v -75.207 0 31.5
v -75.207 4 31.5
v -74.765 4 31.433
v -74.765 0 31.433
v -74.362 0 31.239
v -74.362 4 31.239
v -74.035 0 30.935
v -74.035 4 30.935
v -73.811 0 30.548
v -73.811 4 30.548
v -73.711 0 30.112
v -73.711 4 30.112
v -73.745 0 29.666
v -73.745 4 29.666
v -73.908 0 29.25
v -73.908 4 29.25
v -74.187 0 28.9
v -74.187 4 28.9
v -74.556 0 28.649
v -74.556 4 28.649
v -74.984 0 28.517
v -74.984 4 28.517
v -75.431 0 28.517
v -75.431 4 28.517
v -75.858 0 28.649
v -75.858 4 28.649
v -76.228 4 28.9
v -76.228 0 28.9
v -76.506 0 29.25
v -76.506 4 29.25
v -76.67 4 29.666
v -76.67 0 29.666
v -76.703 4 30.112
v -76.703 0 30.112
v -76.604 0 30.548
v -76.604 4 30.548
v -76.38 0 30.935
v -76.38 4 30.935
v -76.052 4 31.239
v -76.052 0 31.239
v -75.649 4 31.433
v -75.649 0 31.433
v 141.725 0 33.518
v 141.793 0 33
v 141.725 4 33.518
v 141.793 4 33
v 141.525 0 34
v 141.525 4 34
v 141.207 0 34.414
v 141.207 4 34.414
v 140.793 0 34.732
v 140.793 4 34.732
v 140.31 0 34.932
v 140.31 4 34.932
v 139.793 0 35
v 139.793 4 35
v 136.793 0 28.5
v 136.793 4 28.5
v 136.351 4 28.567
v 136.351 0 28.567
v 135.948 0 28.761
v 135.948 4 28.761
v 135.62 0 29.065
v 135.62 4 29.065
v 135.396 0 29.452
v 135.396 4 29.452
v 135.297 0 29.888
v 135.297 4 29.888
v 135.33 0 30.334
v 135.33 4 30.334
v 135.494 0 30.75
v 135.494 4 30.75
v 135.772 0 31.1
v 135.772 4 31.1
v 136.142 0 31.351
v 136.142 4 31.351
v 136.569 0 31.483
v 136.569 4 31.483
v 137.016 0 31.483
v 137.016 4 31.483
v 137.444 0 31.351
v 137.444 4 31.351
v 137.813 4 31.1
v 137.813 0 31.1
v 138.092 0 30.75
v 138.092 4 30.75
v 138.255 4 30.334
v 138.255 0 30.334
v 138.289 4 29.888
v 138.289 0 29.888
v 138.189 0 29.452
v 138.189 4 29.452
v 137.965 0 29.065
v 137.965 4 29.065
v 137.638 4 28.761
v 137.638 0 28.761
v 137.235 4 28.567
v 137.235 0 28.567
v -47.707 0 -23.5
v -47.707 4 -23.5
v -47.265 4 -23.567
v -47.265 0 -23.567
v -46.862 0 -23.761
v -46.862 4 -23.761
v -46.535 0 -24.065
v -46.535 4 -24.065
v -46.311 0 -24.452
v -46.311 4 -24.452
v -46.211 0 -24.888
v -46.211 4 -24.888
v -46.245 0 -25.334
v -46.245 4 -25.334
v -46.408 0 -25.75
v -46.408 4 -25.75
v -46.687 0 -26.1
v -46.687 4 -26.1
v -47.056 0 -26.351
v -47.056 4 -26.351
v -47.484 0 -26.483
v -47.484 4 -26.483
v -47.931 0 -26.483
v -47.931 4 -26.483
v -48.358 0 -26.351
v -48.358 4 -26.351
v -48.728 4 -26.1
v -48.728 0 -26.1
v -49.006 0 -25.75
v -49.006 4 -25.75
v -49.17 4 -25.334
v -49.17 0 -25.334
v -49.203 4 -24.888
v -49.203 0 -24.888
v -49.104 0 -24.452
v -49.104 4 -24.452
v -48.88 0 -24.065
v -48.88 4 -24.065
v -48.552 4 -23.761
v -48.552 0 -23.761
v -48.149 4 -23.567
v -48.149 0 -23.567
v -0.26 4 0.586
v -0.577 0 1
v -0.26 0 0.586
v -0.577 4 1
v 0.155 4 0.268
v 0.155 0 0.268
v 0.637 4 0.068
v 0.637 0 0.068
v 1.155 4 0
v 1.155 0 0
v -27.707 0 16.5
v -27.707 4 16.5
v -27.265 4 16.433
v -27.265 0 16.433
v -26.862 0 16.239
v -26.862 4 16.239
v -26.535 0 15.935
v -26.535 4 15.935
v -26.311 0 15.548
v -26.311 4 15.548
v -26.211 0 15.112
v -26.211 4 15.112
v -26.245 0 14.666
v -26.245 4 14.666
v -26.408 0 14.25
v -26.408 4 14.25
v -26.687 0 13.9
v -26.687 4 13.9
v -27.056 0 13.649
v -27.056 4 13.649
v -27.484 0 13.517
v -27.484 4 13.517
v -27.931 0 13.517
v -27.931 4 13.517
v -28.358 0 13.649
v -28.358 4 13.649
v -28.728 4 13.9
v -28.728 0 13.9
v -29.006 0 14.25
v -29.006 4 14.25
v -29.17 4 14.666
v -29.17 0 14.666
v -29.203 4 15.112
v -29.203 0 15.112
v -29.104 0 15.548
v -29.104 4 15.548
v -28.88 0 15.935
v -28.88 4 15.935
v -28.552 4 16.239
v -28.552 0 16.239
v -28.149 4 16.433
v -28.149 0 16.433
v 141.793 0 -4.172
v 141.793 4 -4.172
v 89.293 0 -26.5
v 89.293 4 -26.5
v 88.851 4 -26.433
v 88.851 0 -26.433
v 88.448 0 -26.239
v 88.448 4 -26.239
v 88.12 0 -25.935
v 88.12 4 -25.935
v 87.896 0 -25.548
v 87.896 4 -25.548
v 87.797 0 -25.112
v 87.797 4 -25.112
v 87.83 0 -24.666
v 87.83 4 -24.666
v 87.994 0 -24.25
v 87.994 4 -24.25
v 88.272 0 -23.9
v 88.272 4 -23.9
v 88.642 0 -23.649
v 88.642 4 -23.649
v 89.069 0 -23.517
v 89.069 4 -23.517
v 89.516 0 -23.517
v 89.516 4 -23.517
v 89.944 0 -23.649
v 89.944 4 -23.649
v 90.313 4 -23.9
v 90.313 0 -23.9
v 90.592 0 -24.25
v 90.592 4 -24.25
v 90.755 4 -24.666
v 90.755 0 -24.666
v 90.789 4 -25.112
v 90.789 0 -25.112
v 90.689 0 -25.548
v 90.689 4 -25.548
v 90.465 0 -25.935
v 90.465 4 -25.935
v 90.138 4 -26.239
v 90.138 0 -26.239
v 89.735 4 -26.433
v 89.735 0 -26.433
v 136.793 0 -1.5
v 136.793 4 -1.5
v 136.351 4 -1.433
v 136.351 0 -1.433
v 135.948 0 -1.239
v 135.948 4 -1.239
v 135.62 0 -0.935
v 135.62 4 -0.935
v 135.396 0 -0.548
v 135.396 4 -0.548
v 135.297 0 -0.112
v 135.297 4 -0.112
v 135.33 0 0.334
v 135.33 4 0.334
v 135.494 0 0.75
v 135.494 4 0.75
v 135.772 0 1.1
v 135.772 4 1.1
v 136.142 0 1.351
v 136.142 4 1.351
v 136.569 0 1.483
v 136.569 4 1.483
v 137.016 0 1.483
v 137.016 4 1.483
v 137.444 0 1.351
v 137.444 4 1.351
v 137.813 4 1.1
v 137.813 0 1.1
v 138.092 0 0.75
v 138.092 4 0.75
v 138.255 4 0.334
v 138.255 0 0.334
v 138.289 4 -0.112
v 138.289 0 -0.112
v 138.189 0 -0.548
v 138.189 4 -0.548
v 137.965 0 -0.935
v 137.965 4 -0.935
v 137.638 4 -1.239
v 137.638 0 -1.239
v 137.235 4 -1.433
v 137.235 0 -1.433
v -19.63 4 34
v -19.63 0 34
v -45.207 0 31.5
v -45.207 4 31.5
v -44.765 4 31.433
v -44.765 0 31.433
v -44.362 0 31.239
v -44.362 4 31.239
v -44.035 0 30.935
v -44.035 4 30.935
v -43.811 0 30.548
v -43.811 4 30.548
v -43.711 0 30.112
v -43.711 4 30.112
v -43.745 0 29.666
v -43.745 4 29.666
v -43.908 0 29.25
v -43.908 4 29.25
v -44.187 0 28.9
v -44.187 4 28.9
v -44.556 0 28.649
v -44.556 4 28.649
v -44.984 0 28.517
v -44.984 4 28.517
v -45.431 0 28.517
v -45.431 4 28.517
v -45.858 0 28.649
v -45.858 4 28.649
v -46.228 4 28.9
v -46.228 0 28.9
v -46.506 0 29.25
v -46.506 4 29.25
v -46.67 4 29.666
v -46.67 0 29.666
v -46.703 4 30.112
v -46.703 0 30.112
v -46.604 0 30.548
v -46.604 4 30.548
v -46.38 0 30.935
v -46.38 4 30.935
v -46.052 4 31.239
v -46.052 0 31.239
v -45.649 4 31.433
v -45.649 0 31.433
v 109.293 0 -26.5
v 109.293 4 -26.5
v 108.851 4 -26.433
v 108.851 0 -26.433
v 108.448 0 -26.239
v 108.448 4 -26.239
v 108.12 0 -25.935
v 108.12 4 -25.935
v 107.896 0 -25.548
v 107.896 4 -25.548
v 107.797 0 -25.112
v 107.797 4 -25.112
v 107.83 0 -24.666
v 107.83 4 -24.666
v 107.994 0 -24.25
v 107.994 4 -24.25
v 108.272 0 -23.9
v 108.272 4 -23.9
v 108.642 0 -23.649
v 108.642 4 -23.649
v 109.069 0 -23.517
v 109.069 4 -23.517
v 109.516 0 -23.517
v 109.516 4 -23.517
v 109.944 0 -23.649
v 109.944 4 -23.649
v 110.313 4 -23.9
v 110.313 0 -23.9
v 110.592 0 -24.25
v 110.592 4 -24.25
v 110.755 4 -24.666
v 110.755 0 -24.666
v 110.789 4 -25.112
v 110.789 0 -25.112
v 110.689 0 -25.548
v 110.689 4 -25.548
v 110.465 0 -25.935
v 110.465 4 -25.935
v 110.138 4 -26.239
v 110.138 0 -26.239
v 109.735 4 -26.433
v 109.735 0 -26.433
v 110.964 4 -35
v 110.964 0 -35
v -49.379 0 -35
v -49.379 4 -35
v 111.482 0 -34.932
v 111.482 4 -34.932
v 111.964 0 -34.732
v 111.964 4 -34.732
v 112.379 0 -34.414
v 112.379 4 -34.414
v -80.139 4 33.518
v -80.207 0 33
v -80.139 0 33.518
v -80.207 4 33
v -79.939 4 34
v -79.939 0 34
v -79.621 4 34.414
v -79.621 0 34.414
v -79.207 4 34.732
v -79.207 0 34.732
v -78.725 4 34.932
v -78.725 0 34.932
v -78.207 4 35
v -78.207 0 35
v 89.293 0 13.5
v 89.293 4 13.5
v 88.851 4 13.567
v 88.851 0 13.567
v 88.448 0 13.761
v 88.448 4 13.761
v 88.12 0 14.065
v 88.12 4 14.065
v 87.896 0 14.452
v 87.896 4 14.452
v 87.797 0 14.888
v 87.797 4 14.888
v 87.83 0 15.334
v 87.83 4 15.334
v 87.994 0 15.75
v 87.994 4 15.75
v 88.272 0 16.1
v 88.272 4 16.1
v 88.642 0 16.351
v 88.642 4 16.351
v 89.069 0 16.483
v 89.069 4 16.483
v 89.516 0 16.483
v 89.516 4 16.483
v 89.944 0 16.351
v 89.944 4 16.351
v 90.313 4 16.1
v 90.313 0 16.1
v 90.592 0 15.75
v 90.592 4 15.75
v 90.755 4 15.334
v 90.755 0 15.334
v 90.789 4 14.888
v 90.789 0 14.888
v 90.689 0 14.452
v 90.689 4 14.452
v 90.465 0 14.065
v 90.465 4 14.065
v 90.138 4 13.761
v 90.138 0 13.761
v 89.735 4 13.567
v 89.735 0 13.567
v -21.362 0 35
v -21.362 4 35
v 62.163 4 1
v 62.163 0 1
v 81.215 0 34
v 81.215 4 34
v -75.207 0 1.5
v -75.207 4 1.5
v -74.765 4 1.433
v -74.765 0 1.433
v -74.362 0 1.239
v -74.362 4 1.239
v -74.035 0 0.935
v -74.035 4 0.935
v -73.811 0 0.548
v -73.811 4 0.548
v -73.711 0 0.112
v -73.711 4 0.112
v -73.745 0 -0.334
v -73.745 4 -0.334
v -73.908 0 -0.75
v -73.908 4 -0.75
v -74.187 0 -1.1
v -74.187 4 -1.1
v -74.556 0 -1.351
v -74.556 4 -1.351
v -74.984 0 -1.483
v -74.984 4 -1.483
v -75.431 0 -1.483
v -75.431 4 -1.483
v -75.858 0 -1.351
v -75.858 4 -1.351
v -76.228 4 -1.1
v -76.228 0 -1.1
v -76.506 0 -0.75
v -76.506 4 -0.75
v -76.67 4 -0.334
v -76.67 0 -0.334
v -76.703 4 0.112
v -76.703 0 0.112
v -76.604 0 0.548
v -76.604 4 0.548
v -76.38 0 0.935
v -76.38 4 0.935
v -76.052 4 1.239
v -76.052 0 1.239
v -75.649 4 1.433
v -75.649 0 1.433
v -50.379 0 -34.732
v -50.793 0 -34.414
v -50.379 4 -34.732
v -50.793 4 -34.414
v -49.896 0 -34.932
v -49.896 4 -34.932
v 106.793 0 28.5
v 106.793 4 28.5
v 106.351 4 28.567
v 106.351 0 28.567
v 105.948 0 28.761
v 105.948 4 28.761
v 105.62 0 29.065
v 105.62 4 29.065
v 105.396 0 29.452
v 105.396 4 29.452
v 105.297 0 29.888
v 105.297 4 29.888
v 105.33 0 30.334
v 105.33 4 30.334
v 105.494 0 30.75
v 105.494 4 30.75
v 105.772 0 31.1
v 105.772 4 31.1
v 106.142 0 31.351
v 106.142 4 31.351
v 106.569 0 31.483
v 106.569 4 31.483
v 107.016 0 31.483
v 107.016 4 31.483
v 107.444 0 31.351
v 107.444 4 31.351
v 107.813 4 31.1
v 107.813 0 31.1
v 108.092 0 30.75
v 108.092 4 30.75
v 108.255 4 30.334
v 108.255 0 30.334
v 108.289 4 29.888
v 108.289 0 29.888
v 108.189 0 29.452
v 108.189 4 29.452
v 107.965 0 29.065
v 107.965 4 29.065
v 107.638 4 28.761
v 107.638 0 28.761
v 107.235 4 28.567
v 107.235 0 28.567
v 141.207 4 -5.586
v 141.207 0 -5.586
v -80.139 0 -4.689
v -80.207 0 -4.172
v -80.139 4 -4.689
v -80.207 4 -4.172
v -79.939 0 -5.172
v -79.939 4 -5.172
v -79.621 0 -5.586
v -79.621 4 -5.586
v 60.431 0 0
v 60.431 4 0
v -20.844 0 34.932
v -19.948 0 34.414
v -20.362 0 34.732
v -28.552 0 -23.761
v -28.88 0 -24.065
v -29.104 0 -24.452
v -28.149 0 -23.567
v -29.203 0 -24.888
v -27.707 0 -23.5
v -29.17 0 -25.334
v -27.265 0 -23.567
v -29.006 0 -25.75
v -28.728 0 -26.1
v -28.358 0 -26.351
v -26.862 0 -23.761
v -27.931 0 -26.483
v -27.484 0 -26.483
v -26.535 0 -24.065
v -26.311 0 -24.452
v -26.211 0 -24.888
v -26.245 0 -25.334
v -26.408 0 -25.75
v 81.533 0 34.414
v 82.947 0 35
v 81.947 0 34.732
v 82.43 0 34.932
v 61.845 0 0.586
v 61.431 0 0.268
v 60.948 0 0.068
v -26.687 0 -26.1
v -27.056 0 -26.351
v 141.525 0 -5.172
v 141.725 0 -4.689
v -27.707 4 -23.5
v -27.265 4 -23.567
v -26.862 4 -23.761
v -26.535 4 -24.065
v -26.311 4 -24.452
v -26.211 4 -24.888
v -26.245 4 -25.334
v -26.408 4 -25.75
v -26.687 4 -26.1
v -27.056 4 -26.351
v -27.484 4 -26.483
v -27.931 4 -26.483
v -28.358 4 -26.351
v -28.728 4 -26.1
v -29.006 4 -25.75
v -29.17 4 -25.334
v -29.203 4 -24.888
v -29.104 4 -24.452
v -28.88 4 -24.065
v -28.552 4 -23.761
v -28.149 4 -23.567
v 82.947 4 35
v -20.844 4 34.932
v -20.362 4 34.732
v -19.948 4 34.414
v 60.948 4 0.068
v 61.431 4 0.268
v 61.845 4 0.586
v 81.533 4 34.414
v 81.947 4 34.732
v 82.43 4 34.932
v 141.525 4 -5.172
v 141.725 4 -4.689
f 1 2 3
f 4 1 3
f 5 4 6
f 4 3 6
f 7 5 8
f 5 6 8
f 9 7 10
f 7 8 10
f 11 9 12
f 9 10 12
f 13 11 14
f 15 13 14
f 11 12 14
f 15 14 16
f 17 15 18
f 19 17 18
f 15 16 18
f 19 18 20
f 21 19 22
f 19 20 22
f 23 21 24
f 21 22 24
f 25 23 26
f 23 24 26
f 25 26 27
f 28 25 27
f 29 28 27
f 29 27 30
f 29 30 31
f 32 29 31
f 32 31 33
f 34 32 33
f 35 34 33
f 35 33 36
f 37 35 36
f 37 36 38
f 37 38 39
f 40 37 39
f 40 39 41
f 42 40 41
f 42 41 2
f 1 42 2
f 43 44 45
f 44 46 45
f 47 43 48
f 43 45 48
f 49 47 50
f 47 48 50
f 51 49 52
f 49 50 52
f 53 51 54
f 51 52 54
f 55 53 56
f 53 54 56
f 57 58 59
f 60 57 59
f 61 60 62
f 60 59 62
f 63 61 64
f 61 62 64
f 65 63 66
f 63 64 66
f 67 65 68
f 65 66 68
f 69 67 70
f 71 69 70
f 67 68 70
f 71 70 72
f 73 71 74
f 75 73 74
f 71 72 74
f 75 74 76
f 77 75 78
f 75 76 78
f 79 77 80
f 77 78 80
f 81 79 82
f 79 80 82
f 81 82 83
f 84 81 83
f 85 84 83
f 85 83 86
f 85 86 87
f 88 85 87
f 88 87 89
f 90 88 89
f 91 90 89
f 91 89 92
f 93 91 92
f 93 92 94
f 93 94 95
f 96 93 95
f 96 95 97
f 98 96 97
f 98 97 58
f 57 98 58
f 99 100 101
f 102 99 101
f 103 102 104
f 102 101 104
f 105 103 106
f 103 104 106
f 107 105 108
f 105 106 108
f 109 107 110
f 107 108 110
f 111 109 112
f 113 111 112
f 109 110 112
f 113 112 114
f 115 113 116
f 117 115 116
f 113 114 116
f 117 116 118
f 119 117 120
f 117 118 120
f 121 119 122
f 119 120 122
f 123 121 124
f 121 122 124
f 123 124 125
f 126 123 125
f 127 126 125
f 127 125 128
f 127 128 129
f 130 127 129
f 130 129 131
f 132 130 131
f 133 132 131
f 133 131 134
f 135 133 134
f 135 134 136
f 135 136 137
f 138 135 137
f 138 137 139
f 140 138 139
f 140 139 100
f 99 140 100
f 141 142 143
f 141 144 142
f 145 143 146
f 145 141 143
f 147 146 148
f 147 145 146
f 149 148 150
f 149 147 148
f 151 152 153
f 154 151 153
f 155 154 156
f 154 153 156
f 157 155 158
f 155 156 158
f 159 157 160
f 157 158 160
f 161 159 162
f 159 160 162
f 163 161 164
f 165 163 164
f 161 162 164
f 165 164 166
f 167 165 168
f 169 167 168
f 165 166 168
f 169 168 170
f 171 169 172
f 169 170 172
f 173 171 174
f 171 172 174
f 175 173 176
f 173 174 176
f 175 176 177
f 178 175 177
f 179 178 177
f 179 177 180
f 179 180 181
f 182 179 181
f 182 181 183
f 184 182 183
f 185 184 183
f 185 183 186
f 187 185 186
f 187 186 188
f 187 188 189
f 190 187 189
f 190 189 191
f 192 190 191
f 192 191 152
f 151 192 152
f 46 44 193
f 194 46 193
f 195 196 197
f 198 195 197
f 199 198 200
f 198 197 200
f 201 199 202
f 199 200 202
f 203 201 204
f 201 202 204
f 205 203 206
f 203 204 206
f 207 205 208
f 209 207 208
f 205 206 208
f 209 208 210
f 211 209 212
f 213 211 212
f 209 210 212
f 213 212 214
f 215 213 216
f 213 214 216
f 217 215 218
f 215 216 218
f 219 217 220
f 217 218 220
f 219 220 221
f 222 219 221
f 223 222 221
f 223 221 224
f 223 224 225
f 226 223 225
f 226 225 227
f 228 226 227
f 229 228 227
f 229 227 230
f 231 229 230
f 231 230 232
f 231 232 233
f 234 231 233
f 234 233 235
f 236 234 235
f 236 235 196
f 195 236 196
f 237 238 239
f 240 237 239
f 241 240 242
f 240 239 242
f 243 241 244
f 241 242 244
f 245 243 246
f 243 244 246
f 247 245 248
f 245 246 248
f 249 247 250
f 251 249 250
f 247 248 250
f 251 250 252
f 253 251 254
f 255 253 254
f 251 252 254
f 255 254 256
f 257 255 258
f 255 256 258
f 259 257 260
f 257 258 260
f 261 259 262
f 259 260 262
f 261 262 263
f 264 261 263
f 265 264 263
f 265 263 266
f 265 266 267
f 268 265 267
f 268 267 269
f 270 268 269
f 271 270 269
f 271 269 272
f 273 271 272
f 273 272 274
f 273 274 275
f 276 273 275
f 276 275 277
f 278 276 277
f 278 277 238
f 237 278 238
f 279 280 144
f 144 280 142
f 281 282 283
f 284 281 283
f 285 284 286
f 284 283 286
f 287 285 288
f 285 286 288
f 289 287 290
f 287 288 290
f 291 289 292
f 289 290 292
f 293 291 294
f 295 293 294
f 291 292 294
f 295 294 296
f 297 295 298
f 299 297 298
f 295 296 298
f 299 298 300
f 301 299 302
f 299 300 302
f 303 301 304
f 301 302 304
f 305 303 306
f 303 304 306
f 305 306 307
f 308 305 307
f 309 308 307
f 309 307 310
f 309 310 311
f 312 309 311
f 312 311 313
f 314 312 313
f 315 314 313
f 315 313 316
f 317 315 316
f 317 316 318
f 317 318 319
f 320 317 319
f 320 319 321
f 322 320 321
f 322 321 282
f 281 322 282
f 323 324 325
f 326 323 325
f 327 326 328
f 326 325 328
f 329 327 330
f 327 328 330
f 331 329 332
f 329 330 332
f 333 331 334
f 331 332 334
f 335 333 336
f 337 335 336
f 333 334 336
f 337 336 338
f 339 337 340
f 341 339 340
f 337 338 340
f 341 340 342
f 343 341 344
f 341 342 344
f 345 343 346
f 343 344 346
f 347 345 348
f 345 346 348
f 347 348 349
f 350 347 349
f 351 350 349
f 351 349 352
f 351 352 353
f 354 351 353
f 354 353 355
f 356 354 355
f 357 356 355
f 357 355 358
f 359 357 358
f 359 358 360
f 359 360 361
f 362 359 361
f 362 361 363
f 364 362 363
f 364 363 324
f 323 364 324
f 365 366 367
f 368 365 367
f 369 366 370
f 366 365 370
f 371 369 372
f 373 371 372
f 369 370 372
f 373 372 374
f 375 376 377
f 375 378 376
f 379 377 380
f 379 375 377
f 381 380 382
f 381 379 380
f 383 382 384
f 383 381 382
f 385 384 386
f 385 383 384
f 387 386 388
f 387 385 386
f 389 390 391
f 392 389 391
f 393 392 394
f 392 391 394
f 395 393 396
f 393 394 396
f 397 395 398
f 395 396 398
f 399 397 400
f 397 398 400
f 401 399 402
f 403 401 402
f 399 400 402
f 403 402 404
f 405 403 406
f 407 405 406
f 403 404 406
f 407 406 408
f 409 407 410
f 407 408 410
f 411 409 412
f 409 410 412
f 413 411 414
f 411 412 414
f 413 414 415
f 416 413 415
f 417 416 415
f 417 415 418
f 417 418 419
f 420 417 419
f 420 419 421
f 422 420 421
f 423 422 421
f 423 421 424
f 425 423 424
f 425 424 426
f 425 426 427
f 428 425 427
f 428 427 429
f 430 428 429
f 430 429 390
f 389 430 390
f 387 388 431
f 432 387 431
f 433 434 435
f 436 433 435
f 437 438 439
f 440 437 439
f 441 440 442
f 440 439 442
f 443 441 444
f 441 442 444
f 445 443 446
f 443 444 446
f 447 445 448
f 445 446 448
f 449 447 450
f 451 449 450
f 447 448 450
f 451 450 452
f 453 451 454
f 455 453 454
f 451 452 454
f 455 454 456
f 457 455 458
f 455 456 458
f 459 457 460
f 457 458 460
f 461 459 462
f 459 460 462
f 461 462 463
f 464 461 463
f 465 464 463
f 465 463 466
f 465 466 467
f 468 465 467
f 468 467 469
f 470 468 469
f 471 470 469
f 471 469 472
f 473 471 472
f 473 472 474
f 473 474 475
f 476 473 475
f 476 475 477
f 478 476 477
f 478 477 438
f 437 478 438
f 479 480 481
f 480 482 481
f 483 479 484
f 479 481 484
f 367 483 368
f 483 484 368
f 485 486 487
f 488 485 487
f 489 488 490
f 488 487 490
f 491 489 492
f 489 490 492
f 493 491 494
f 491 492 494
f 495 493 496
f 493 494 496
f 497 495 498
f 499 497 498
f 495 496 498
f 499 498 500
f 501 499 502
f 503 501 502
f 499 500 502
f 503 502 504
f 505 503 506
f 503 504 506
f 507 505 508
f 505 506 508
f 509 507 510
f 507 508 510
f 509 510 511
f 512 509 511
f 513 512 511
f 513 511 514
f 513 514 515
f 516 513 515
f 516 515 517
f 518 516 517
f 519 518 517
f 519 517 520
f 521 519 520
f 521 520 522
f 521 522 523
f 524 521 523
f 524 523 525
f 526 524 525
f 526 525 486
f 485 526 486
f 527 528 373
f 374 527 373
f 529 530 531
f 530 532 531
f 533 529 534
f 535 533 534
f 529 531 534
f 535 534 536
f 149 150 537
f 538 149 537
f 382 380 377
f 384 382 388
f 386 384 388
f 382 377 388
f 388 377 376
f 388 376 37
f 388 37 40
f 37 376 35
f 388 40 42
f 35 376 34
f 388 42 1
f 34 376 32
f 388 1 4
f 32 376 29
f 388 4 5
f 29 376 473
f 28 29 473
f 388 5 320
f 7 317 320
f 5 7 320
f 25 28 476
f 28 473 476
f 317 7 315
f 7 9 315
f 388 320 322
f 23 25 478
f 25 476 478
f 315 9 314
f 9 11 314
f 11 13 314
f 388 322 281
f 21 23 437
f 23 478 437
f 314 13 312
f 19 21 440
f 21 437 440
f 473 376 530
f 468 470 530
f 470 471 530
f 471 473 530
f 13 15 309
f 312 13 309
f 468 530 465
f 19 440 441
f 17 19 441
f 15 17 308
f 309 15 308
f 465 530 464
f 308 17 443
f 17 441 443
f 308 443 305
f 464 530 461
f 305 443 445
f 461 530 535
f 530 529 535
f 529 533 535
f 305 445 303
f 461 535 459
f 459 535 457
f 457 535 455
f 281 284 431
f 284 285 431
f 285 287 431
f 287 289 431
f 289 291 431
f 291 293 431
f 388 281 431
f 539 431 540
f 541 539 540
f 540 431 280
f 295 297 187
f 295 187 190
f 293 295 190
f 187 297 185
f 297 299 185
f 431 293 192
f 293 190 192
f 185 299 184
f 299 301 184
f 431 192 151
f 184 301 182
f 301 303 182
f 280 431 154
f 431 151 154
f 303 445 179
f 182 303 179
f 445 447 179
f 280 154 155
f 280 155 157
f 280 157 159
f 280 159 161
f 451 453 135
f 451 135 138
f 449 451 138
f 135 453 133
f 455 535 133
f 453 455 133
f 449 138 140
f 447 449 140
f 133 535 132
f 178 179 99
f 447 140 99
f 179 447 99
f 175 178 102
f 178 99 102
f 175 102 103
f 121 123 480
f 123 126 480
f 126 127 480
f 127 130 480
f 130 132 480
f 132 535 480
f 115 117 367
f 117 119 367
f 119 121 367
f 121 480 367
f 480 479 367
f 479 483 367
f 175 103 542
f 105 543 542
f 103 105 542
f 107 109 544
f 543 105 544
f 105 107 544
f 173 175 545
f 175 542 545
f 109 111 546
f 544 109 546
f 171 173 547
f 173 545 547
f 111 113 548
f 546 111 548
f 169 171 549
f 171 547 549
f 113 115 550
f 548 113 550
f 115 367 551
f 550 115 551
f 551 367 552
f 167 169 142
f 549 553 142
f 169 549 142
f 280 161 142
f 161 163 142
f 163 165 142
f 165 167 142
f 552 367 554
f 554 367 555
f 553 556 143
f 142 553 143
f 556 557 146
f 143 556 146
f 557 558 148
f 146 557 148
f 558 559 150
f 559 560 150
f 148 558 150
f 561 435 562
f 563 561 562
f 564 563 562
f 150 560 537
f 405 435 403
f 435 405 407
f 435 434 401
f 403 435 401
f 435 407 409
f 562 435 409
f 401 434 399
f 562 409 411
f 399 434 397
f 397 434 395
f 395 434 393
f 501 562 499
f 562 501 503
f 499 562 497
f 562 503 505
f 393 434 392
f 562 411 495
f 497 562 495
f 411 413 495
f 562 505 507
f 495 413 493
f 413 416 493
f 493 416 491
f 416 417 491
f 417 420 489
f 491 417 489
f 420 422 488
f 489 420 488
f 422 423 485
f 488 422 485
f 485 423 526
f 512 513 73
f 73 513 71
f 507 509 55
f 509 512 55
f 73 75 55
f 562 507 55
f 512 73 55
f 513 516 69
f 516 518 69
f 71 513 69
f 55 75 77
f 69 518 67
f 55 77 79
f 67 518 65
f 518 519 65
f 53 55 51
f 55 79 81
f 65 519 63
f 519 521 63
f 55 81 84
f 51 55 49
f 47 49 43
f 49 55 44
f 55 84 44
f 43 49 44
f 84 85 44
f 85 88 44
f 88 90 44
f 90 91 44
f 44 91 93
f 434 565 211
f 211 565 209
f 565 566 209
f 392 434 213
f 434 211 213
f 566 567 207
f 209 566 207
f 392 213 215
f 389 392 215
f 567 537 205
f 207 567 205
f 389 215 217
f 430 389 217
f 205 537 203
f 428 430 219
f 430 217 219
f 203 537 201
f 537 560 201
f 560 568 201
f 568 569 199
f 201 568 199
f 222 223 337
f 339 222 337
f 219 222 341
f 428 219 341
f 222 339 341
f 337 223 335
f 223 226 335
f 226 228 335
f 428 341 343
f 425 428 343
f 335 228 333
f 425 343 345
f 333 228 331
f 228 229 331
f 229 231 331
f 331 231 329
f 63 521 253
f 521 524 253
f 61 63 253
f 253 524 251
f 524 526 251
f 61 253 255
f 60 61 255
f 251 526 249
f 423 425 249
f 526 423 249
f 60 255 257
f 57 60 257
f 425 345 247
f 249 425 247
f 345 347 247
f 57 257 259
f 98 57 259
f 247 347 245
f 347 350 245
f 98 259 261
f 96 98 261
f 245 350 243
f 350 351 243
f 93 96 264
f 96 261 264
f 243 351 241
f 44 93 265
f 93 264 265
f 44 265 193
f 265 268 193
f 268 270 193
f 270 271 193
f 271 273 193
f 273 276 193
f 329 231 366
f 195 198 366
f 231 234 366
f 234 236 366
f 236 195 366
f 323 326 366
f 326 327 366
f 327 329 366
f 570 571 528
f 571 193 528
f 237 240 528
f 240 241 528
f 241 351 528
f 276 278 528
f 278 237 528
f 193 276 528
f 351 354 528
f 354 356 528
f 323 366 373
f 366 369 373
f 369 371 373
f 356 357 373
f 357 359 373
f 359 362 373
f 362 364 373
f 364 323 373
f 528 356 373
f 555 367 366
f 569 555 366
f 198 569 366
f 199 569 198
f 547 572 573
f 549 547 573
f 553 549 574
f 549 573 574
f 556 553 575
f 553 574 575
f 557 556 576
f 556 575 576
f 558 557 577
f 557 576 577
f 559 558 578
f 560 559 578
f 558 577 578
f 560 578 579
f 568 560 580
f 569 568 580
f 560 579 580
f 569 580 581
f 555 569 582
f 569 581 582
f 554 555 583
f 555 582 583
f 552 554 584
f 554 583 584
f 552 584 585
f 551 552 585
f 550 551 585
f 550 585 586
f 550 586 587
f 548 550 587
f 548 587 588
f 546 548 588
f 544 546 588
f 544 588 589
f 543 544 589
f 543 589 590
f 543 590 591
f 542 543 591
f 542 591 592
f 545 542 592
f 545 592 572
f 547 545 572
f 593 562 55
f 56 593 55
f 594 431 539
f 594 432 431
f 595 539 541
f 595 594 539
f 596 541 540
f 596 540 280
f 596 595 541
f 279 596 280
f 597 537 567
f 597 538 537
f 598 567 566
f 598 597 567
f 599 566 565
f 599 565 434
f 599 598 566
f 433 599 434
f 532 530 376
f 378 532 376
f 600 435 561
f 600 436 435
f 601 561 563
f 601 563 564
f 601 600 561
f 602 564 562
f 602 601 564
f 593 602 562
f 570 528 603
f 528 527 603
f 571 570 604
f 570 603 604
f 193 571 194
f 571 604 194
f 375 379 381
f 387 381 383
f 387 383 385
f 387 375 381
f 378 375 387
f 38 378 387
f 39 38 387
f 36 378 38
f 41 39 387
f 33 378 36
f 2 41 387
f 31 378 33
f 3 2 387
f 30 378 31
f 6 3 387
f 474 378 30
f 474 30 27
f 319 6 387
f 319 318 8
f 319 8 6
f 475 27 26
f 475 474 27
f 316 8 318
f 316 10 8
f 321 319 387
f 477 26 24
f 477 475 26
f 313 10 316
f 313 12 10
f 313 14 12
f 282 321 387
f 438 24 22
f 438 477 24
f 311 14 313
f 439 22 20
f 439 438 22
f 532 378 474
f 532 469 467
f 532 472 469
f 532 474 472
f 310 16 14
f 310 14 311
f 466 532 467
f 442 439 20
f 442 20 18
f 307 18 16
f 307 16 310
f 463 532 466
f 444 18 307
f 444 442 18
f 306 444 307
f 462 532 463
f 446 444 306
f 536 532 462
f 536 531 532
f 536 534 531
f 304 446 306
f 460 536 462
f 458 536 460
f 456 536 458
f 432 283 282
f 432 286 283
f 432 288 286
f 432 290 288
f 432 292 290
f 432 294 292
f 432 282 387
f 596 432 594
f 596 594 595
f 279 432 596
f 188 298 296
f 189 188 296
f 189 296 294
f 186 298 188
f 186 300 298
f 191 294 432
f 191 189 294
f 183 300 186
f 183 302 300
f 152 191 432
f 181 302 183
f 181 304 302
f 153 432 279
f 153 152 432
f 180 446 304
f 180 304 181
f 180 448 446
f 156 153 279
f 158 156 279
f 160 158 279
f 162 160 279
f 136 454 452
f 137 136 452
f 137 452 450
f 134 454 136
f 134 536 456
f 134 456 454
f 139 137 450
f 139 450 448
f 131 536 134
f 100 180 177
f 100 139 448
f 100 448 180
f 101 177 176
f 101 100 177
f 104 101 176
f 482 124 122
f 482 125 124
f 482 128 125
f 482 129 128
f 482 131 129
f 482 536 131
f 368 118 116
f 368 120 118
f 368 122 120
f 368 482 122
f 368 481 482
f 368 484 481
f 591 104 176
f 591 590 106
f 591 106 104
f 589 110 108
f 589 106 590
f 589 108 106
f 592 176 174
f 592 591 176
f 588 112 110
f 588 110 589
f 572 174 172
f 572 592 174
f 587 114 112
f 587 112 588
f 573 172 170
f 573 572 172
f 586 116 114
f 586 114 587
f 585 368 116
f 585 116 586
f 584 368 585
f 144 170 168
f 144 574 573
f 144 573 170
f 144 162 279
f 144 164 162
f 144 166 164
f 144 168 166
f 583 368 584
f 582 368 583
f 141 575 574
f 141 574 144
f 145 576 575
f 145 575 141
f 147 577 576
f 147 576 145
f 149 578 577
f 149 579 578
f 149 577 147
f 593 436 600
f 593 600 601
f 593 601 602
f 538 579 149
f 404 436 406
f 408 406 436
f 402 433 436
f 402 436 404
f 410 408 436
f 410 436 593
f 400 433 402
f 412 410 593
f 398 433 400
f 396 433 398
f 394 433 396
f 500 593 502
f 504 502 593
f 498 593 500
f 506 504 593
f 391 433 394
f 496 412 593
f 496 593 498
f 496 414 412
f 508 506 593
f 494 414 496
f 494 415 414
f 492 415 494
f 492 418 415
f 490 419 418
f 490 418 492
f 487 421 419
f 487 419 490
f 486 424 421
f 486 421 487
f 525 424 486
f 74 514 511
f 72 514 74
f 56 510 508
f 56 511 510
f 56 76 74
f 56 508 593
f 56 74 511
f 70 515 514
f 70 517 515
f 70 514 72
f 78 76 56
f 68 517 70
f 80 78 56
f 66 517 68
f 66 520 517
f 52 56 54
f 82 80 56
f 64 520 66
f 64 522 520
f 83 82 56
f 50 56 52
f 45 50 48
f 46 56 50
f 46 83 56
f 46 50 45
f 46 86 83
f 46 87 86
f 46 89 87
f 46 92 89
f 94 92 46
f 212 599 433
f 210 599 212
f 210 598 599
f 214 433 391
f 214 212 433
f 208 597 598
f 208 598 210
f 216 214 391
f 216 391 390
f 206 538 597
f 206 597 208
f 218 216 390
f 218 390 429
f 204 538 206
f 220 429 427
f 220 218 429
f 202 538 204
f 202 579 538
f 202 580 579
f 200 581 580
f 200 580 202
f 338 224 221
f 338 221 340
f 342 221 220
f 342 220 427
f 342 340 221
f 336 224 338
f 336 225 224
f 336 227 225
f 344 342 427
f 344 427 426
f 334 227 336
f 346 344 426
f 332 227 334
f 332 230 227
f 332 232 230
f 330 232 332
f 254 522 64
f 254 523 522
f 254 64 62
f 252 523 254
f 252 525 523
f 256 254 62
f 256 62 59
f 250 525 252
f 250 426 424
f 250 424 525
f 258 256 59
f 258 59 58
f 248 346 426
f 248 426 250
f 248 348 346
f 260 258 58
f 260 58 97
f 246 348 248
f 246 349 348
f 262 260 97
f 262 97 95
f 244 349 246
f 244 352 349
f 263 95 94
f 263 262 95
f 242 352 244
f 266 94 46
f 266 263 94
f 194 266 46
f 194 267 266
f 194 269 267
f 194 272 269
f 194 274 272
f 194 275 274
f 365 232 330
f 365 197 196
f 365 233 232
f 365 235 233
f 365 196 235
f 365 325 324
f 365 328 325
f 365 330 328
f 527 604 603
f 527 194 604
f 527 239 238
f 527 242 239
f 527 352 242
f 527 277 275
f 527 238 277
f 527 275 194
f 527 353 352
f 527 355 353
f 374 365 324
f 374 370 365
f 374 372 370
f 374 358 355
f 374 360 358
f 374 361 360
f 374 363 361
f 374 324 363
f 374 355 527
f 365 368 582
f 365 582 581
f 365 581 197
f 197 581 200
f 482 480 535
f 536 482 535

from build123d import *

# Parameters (mm, degrees)
EXTRUDE_1_DEPTH     = 4
SKETCH_2_R          = 1.5
CUT_EXTRUDE_1_DEPTH = 10
FILLET_2_R          = 2


with BuildPart() as part:
    # 草图1 → 凸台-拉伸1 (new body)
    with BuildSketch(Plane(origin=(0, 0, 0), x_dir=(1, 0, 0), z_dir=(0, 1, 0))):
        Polygon((-80.207259422, 5), (-80.207259422, -35), (-20.207259422, -35), (0, 0), (61.585481157, 0), (81.792740578, -35), (141.792740578, -35), (141.792740578, 5), (111.792740578, 35), (-50.207259422, 35), align=None)
    extrude(amount=EXTRUDE_1_DEPTH)

    # 草图2 → 切除-拉伸1 (cut)
    with BuildSketch(Plane(origin=(0, 4, 0), x_dir=(1, 0, 0), z_dir=(0, 1, 0))):
        with Locations(Location((-27.707259422, -15, 0), (0, 0, 270))):
            Circle(SKETCH_2_R)
        with Locations(Location((-27.707259422, 25, 0), (0, 0, 270))):
            Circle(SKETCH_2_R)
        with Locations(Location((-75.207259422, -30, 0), (0, 0, 270))):
            Circle(SKETCH_2_R)
        with Locations(Location((-45.207259422, -30, 0), (0, 0, 270))):
            Circle(SKETCH_2_R)
        with Locations(Location((-75.207259422, 0, 0), (0, 0, 270))):
            Circle(SKETCH_2_R)
        with Locations(Location((-47.707259422, 25, 0), (0, 0, 270))):
            Circle(SKETCH_2_R)
        with Locations(Location((109.292740578, 25, 0), (0, 0, 90))):
            Circle(SKETCH_2_R)
        with Locations(Location((136.792740578, 0, 0), (0, 0, 90))):
            Circle(SKETCH_2_R)
        with Locations(Location((106.792740578, -30, 0), (0, 0, 90))):
            Circle(SKETCH_2_R)
        with Locations(Location((136.792740578, -30, 0), (0, 0, 90))):
            Circle(SKETCH_2_R)
        with Locations(Location((89.292740578, 25, 0), (0, 0, 90))):
            Circle(SKETCH_2_R)
        with Locations(Location((89.292740578, -15, 0), (0, 0, 90))):
            Circle(SKETCH_2_R)
    extrude(amount=-CUT_EXTRUDE_1_DEPTH, mode=Mode.SUBTRACT)

    # 圆角2
    fillet_2_edges = [part.edges().sort_by_distance(p)[0] for p in [
        (-50.207259422, 2, -35),
        (111.792740578, 2, -35),
        (141.792740578, 2, -5),
        (141.792740578, 2, 35),
        (81.792740578, 2, 35),
        (61.585481157, 2, 0),
        (0, 2, 0),
        (-20.207259422, 2, 35),
        (-80.207259422, 2, 35),
        (-80.207259422, 2, -5),
    ]]
    fillet(fillet_2_edges, radius=FILLET_2_R)


solid = part.part
